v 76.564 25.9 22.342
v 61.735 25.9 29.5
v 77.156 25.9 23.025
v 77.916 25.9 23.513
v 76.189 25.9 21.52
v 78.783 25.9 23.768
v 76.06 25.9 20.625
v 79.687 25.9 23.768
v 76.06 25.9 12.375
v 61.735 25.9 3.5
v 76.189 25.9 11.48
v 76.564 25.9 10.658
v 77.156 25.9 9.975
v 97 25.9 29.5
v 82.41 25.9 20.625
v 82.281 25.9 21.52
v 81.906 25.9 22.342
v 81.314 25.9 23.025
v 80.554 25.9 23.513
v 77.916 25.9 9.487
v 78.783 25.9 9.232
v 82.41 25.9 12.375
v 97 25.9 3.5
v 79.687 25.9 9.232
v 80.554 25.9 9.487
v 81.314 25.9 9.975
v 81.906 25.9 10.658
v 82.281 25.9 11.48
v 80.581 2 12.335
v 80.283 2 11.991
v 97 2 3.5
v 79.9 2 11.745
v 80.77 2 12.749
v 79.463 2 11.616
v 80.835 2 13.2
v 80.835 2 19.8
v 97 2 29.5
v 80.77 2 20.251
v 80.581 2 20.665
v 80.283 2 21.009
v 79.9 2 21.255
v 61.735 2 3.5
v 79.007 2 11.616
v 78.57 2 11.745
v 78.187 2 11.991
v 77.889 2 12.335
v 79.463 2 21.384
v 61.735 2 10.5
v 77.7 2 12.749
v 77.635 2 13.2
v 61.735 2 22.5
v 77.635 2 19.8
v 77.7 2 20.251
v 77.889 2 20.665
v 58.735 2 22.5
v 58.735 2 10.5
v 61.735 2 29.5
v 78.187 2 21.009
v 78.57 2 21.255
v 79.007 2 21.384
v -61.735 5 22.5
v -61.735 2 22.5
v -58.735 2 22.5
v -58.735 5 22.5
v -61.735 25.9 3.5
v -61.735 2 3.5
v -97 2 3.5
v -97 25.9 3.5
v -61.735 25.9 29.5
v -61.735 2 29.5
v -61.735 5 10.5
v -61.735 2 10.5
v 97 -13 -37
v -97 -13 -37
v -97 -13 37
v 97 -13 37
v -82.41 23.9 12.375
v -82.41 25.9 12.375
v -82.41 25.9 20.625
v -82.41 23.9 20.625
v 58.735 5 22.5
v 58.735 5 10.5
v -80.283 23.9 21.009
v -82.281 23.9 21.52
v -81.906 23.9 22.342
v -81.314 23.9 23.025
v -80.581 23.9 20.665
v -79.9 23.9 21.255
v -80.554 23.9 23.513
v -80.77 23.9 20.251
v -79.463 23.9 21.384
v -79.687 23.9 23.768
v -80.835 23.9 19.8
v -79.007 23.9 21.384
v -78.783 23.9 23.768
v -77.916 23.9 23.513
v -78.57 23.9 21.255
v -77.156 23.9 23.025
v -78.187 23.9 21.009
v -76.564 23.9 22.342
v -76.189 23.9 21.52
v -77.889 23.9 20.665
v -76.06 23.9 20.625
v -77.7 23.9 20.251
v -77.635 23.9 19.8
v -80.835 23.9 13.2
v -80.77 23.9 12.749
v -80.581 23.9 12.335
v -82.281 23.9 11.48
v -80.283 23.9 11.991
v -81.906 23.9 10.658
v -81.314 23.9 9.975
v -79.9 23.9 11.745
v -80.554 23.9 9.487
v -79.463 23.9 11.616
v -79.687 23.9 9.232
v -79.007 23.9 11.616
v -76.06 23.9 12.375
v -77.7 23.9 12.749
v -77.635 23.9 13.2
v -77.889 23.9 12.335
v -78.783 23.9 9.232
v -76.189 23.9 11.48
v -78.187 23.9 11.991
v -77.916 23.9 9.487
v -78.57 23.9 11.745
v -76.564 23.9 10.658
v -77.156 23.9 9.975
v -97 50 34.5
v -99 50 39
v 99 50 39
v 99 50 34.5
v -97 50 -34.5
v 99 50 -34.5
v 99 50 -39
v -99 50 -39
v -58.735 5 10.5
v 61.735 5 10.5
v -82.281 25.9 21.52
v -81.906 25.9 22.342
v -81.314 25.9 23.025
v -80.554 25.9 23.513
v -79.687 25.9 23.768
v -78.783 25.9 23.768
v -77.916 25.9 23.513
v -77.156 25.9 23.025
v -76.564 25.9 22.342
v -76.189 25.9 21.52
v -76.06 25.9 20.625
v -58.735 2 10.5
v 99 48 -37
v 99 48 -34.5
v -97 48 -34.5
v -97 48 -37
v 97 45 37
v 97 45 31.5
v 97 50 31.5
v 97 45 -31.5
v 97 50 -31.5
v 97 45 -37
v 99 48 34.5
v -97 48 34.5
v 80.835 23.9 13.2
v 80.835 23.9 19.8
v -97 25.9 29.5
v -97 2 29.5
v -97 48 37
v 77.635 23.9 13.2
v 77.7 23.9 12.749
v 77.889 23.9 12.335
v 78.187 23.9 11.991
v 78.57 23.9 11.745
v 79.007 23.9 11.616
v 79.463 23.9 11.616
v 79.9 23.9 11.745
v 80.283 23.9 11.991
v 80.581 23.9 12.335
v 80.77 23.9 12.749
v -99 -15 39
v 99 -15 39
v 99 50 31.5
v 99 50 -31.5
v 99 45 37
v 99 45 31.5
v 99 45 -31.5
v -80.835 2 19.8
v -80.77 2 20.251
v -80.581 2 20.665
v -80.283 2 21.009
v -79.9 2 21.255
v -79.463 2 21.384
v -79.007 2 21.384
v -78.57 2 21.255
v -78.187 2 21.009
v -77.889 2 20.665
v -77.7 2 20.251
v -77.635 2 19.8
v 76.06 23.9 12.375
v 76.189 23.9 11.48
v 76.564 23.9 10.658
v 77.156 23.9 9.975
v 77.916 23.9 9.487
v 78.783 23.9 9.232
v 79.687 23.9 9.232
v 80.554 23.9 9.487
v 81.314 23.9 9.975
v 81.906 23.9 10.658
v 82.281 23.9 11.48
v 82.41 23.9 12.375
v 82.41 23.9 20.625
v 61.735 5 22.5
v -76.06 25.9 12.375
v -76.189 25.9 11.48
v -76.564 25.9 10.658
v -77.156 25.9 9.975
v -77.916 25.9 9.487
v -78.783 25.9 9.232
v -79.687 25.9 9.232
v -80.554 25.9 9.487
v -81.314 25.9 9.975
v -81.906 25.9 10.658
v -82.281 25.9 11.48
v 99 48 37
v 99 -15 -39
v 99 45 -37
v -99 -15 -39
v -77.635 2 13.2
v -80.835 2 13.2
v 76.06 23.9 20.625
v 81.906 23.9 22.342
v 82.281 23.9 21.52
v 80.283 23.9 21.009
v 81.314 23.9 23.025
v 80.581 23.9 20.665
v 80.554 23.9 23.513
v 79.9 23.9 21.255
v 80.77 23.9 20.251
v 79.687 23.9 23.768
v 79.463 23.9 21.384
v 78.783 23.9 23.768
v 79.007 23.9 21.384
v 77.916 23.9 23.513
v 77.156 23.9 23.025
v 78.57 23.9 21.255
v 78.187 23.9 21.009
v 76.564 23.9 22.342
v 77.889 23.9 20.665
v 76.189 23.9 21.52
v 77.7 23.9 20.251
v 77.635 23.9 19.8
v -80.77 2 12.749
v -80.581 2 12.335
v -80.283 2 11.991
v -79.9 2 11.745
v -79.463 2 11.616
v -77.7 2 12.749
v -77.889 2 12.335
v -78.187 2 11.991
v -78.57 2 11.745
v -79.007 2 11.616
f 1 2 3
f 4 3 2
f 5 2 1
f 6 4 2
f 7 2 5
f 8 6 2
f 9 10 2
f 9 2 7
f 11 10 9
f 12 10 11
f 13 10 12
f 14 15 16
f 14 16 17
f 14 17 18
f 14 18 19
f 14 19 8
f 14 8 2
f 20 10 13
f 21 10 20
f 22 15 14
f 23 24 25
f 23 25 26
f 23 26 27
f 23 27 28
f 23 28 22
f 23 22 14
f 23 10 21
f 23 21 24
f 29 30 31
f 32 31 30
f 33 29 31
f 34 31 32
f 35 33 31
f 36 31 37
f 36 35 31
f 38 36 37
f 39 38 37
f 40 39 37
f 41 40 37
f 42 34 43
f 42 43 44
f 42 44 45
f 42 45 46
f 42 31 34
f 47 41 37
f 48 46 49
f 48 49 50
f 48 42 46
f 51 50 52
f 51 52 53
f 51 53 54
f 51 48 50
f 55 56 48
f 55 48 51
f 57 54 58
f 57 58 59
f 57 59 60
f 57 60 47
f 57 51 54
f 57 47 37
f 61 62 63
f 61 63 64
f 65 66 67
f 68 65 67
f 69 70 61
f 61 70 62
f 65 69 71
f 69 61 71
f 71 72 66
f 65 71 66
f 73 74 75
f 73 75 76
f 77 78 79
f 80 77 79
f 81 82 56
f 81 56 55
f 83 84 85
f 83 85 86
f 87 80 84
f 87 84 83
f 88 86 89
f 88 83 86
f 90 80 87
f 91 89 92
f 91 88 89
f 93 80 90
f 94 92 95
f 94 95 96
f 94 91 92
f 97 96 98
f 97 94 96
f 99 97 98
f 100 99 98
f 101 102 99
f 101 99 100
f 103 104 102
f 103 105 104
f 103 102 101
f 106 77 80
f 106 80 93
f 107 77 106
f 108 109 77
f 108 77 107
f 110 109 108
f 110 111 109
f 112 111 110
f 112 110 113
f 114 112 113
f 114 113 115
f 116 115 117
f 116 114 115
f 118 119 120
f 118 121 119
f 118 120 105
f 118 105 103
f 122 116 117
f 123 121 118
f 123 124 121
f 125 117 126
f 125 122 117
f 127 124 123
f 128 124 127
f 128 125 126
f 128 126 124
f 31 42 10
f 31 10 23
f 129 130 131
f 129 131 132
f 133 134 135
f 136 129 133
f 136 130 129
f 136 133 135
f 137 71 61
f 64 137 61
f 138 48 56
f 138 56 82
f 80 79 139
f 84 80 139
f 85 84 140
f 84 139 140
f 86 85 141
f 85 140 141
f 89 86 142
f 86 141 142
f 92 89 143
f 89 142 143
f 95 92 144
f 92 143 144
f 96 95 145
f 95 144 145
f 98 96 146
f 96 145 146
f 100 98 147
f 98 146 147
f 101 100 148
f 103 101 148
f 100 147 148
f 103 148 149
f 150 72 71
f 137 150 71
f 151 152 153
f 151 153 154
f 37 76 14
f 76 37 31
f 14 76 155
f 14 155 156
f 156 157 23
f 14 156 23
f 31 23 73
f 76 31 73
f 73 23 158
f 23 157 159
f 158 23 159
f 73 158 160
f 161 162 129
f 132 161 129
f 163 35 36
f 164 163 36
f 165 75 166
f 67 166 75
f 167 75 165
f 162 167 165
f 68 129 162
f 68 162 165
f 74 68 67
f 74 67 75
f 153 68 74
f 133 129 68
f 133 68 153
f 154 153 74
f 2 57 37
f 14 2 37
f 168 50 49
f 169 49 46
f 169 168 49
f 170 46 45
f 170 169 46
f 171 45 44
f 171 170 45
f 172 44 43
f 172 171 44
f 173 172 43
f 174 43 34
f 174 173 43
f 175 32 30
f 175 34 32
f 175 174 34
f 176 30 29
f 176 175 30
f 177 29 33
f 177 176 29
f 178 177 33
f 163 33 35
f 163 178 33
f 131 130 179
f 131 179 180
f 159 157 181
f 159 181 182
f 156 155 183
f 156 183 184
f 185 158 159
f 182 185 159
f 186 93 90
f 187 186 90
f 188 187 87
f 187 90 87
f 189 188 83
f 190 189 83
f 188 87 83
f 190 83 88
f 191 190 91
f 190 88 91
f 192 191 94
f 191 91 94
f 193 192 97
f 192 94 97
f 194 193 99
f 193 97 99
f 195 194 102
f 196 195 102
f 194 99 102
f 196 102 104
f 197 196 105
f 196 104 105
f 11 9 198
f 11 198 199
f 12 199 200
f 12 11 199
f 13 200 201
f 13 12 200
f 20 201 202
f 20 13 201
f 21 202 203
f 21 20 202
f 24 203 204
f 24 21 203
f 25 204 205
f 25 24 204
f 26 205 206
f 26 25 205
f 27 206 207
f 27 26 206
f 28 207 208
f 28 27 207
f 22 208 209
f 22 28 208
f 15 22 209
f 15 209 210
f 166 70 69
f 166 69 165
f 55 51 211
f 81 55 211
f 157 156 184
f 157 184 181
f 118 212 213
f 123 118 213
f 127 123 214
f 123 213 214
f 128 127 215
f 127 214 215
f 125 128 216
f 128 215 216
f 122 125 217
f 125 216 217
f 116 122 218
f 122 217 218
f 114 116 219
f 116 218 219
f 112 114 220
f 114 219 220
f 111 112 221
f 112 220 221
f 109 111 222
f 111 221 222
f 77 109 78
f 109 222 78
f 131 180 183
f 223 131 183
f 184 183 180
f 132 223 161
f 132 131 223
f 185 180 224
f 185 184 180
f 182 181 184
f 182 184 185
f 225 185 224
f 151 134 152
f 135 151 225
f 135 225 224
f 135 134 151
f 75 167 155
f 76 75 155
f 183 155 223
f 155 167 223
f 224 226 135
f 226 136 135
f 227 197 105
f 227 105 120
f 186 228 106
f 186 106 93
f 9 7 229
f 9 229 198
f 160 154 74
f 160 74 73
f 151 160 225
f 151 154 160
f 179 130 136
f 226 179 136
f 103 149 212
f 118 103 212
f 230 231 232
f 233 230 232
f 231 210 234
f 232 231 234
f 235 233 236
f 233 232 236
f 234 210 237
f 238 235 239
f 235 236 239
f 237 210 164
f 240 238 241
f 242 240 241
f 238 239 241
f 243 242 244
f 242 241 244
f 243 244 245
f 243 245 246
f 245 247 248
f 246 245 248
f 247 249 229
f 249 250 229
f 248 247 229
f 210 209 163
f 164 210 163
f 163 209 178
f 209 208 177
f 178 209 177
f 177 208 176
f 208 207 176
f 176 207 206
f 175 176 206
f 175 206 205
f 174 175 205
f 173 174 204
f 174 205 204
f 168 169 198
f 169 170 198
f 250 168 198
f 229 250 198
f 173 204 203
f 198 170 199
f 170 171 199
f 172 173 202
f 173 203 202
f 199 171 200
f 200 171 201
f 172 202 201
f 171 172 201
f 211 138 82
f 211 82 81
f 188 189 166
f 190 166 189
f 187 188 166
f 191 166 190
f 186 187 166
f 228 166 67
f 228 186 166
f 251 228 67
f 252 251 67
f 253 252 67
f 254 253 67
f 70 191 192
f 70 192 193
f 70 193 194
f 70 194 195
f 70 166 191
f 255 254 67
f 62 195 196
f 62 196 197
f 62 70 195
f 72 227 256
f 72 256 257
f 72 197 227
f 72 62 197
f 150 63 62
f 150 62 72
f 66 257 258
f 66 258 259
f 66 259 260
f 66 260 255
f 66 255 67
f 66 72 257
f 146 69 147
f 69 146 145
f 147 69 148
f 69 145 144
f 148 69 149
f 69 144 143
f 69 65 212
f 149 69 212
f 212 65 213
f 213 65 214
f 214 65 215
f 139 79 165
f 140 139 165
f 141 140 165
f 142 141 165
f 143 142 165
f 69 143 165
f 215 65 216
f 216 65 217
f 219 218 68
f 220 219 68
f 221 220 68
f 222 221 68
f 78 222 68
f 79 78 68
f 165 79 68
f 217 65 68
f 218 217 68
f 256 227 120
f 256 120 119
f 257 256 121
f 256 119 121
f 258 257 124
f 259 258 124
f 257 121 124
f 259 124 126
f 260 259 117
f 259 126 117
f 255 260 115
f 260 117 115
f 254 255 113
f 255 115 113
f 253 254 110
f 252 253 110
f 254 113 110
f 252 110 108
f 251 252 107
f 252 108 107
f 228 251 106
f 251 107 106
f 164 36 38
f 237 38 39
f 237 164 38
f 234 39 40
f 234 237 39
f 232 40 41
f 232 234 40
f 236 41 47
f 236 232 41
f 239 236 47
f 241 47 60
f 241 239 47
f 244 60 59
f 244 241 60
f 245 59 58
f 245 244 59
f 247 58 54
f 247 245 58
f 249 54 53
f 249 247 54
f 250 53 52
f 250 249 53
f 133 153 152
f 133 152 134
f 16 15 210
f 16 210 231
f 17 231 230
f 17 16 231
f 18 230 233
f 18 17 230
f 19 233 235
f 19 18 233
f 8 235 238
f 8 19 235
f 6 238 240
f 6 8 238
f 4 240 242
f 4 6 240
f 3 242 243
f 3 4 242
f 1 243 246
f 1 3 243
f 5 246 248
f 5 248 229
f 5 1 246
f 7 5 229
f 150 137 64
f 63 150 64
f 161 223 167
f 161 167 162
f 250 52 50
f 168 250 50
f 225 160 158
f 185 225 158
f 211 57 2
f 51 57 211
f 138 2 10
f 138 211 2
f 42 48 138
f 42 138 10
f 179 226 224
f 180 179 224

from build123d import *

# Parameters (mm, degrees)
SKETCH2_W                = 198
SKETCH2_H                = 78
BOSS_EXTRUDE1_DEPTH      = 50
BOSS_EXTRUDE1_DEPTH_BACK = 15
SHELL1_T                 = -2
BOSS_EXTRUDE2_REACH      = 198
SKETCH3_W                = 2.5
SKETCH3_H                = 2
CUT_EXTRUDE1_REACH       = 4
CROQUIS1_W               = 35.265
CROQUIS1_H               = 26
SALIENTE_EXTRUIR1_DEPTH  = 38.9
CORTAR_EXTRUIR1_DEPTH    = 2
CORTAR_EXTRUIR2_DEPTH    = 30
CROQUIS5_W               = 26
CROQUIS5_H               = 15
CORTAR_EXTRUIR3_DEPTH    = 35.265
CROQUIS6_W               = 12
CROQUIS6_H               = 3
SALIENTE_EXTRUIR2_DEPTH  = 3
CROQUIS7_W               = 26
CROQUIS7_H               = 15
CORTAR_EXTRUIR4_DEPTH    = 35.265


with BuildPart() as part:
    # Sketch2 → Boss-Extrude1 (new body, two sides)
    with BuildSketch(Plane(origin=(0, 0, 0), x_dir=(1, 0, 0), z_dir=(0, 1, 0))) as boss_extrude1_sk:
        Rectangle(SKETCH2_W, SKETCH2_H)
    extrude(amount=BOSS_EXTRUDE1_DEPTH)
    extrude(boss_extrude1_sk.sketch, amount=-BOSS_EXTRUDE1_DEPTH_BACK)

    # Shell1
    shell1_openings = [part.faces().sort_by_distance(p)[0] for p in [
        (0, 50, 0),
    ]]
    offset(amount=SHELL1_T, openings=shell1_openings, kind=Kind.INTERSECTION)

    # Sketch3 → Boss-Extrude2 (add, up to next)
    with BuildSketch(Plane(origin=(-97, 0, 0), x_dir=(0, 0, -1), z_dir=(1, 0, 0)), mode=Mode.PRIVATE) as boss_extrude2_sk1:
        with Locations((-35.75, 49)):
            Rectangle(SKETCH3_W, SKETCH3_H)
    boss_extrude2_tool1 = extrude(boss_extrude2_sk1.sketch, amount=BOSS_EXTRUDE2_REACH, mode=Mode.PRIVATE) - part.part
    add(boss_extrude2_tool1.solids().sort_by_distance((-97, 49, 35.75))[0])
    # Sketch3 → Boss-Extrude2 (add, up to next)
    with BuildSketch(Plane(origin=(-97, 0, 0), x_dir=(0, 0, -1), z_dir=(1, 0, 0)), mode=Mode.PRIVATE) as boss_extrude2_sk2:
        with Locations((35.75, 49)):
            Rectangle(SKETCH3_W, SKETCH3_H)
    boss_extrude2_tool2 = extrude(boss_extrude2_sk2.sketch, amount=BOSS_EXTRUDE2_REACH, mode=Mode.PRIVATE) - part.part
    add(boss_extrude2_tool2.solids().sort_by_distance((-97, 49, -35.75))[0])

    # Sketch4 → Cut-Extrude1 (cut, up to next)
    with BuildSketch(Plane.ZY.offset(-97), mode=Mode.PRIVATE) as cut_extrude1_sk1:
        Polygon((-37, 48), (-37, 45), (-31.5, 45), (-31.5, 50), (-34.5, 50), (-34.5, 48), align=None)
    cut_extrude1_tool1 = extrude(cut_extrude1_sk1.sketch, amount=-CUT_EXTRUDE1_REACH, mode=Mode.PRIVATE) & part.part
    add(cut_extrude1_tool1.solids().sort_by_distance((97, 47.166667, -33.916667))[0], mode=Mode.SUBTRACT)
    # Sketch4 → Cut-Extrude1 (cut, up to next)
    with BuildSketch(Plane.ZY.offset(-97), mode=Mode.PRIVATE) as cut_extrude1_sk2:
        Polygon((34.5, 48), (37, 48), (37, 45), (31.5, 45), (31.5, 50), (34.5, 50), align=None)
    cut_extrude1_tool2 = extrude(cut_extrude1_sk2.sketch, amount=-CUT_EXTRUDE1_REACH, mode=Mode.PRIVATE) & part.part
    add(cut_extrude1_tool2.solids().sort_by_distance((97, 47.166667, 33.916667))[0], mode=Mode.SUBTRACT)

    # Croquis1 → Saliente-Extruir1 (add)
    with BuildSketch(Plane(origin=(0, -13, 0), x_dir=(1, 0, 0), z_dir=(0, 1, 0))):
        with Locations((79.3675, -16.5)):
            Rectangle(CROQUIS1_W, CROQUIS1_H)
    saliente_extruir1 = extrude(amount=SALIENTE_EXTRUIR1_DEPTH)

    # Simetría1: Saliente-Extruir1 across plane
    add(saliente_extruir1.mirror(Plane(origin=(0, 0, 0), x_dir=(0, 0, 1), z_dir=(1, 0, 0))))

    # Croquis2 → Cortar-Extruir1 (cut)
    with BuildSketch(Plane(origin=(0, 25.9, 0), x_dir=(1, 0, 0), z_dir=(0, 1, 0))):
        with BuildLine():
            Line((82.41, -12.375), (82.41, -20.625))
            ThreePointArc((82.41, -20.625), (79.235, -23.8), (76.06, -20.625))
            Line((76.06, -20.625), (76.06, -12.375))
            ThreePointArc((76.06, -12.375), (79.235, -9.2), (82.41, -12.375))
        make_face()
    cortar_extruir1 = extrude(amount=-CORTAR_EXTRUIR1_DEPTH, mode=Mode.SUBTRACT)

    # Simetría2: Cortar-Extruir1 across plane
    add(cortar_extruir1.mirror(Plane(origin=(0, 0, 0), x_dir=(0, 0, 1), z_dir=(1, 0, 0))), mode=Mode.SUBTRACT)

    # Croquis3 → Cortar-Extruir2 (cut)
    with BuildSketch(Plane(origin=(0, 23.9, 0), x_dir=(1, 0, 0), z_dir=(0, 1, 0))):
        with BuildLine():
            Line((80.835, -13.2), (80.835, -19.8))
            ThreePointArc((80.835, -19.8), (79.235, -21.4), (77.635, -19.8))
            Line((77.635, -19.8), (77.635, -13.2))
            ThreePointArc((77.635, -13.2), (79.235, -11.6), (80.835, -13.2))
        make_face()
    cortar_extruir2 = extrude(amount=-CORTAR_EXTRUIR2_DEPTH, mode=Mode.SUBTRACT)

    # Simetría3: Cortar-Extruir2 across plane
    add(cortar_extruir2.mirror(Plane(origin=(0, 0, 0), x_dir=(0, 0, 1), z_dir=(1, 0, 0))), mode=Mode.SUBTRACT)

    # Croquis5 → Cortar-Extruir3 (cut)
    with BuildSketch(Plane.ZY.offset(-61.735)):
        with Locations((16.5, -5.5)):
            Rectangle(CROQUIS5_W, CROQUIS5_H)
    extrude(amount=-CORTAR_EXTRUIR3_DEPTH, mode=Mode.SUBTRACT)

    # Croquis6 → Saliente-Extruir2 (add)
    with BuildSketch(Plane.ZY.offset(-61.735)):
        with Locations((16.5, 3.5)):
            Rectangle(CROQUIS6_W, CROQUIS6_H)
    saliente_extruir2 = extrude(amount=SALIENTE_EXTRUIR2_DEPTH)

    # Croquis7 → Cortar-Extruir4 (cut)
    with BuildSketch(Plane(origin=(-61.735, 0, 0), x_dir=(0, 0, -1), z_dir=(1, 0, 0))):
        with Locations((-16.5, -5.5)):
            Rectangle(CROQUIS7_W, CROQUIS7_H)
    extrude(amount=-CORTAR_EXTRUIR4_DEPTH, mode=Mode.SUBTRACT)

    # Simetría7: Saliente-Extruir2 across plane
    add(saliente_extruir2.mirror(Plane(origin=(0, 0, 0), x_dir=(0, 0, 1), z_dir=(1, 0, 0))))


solid = part.part
